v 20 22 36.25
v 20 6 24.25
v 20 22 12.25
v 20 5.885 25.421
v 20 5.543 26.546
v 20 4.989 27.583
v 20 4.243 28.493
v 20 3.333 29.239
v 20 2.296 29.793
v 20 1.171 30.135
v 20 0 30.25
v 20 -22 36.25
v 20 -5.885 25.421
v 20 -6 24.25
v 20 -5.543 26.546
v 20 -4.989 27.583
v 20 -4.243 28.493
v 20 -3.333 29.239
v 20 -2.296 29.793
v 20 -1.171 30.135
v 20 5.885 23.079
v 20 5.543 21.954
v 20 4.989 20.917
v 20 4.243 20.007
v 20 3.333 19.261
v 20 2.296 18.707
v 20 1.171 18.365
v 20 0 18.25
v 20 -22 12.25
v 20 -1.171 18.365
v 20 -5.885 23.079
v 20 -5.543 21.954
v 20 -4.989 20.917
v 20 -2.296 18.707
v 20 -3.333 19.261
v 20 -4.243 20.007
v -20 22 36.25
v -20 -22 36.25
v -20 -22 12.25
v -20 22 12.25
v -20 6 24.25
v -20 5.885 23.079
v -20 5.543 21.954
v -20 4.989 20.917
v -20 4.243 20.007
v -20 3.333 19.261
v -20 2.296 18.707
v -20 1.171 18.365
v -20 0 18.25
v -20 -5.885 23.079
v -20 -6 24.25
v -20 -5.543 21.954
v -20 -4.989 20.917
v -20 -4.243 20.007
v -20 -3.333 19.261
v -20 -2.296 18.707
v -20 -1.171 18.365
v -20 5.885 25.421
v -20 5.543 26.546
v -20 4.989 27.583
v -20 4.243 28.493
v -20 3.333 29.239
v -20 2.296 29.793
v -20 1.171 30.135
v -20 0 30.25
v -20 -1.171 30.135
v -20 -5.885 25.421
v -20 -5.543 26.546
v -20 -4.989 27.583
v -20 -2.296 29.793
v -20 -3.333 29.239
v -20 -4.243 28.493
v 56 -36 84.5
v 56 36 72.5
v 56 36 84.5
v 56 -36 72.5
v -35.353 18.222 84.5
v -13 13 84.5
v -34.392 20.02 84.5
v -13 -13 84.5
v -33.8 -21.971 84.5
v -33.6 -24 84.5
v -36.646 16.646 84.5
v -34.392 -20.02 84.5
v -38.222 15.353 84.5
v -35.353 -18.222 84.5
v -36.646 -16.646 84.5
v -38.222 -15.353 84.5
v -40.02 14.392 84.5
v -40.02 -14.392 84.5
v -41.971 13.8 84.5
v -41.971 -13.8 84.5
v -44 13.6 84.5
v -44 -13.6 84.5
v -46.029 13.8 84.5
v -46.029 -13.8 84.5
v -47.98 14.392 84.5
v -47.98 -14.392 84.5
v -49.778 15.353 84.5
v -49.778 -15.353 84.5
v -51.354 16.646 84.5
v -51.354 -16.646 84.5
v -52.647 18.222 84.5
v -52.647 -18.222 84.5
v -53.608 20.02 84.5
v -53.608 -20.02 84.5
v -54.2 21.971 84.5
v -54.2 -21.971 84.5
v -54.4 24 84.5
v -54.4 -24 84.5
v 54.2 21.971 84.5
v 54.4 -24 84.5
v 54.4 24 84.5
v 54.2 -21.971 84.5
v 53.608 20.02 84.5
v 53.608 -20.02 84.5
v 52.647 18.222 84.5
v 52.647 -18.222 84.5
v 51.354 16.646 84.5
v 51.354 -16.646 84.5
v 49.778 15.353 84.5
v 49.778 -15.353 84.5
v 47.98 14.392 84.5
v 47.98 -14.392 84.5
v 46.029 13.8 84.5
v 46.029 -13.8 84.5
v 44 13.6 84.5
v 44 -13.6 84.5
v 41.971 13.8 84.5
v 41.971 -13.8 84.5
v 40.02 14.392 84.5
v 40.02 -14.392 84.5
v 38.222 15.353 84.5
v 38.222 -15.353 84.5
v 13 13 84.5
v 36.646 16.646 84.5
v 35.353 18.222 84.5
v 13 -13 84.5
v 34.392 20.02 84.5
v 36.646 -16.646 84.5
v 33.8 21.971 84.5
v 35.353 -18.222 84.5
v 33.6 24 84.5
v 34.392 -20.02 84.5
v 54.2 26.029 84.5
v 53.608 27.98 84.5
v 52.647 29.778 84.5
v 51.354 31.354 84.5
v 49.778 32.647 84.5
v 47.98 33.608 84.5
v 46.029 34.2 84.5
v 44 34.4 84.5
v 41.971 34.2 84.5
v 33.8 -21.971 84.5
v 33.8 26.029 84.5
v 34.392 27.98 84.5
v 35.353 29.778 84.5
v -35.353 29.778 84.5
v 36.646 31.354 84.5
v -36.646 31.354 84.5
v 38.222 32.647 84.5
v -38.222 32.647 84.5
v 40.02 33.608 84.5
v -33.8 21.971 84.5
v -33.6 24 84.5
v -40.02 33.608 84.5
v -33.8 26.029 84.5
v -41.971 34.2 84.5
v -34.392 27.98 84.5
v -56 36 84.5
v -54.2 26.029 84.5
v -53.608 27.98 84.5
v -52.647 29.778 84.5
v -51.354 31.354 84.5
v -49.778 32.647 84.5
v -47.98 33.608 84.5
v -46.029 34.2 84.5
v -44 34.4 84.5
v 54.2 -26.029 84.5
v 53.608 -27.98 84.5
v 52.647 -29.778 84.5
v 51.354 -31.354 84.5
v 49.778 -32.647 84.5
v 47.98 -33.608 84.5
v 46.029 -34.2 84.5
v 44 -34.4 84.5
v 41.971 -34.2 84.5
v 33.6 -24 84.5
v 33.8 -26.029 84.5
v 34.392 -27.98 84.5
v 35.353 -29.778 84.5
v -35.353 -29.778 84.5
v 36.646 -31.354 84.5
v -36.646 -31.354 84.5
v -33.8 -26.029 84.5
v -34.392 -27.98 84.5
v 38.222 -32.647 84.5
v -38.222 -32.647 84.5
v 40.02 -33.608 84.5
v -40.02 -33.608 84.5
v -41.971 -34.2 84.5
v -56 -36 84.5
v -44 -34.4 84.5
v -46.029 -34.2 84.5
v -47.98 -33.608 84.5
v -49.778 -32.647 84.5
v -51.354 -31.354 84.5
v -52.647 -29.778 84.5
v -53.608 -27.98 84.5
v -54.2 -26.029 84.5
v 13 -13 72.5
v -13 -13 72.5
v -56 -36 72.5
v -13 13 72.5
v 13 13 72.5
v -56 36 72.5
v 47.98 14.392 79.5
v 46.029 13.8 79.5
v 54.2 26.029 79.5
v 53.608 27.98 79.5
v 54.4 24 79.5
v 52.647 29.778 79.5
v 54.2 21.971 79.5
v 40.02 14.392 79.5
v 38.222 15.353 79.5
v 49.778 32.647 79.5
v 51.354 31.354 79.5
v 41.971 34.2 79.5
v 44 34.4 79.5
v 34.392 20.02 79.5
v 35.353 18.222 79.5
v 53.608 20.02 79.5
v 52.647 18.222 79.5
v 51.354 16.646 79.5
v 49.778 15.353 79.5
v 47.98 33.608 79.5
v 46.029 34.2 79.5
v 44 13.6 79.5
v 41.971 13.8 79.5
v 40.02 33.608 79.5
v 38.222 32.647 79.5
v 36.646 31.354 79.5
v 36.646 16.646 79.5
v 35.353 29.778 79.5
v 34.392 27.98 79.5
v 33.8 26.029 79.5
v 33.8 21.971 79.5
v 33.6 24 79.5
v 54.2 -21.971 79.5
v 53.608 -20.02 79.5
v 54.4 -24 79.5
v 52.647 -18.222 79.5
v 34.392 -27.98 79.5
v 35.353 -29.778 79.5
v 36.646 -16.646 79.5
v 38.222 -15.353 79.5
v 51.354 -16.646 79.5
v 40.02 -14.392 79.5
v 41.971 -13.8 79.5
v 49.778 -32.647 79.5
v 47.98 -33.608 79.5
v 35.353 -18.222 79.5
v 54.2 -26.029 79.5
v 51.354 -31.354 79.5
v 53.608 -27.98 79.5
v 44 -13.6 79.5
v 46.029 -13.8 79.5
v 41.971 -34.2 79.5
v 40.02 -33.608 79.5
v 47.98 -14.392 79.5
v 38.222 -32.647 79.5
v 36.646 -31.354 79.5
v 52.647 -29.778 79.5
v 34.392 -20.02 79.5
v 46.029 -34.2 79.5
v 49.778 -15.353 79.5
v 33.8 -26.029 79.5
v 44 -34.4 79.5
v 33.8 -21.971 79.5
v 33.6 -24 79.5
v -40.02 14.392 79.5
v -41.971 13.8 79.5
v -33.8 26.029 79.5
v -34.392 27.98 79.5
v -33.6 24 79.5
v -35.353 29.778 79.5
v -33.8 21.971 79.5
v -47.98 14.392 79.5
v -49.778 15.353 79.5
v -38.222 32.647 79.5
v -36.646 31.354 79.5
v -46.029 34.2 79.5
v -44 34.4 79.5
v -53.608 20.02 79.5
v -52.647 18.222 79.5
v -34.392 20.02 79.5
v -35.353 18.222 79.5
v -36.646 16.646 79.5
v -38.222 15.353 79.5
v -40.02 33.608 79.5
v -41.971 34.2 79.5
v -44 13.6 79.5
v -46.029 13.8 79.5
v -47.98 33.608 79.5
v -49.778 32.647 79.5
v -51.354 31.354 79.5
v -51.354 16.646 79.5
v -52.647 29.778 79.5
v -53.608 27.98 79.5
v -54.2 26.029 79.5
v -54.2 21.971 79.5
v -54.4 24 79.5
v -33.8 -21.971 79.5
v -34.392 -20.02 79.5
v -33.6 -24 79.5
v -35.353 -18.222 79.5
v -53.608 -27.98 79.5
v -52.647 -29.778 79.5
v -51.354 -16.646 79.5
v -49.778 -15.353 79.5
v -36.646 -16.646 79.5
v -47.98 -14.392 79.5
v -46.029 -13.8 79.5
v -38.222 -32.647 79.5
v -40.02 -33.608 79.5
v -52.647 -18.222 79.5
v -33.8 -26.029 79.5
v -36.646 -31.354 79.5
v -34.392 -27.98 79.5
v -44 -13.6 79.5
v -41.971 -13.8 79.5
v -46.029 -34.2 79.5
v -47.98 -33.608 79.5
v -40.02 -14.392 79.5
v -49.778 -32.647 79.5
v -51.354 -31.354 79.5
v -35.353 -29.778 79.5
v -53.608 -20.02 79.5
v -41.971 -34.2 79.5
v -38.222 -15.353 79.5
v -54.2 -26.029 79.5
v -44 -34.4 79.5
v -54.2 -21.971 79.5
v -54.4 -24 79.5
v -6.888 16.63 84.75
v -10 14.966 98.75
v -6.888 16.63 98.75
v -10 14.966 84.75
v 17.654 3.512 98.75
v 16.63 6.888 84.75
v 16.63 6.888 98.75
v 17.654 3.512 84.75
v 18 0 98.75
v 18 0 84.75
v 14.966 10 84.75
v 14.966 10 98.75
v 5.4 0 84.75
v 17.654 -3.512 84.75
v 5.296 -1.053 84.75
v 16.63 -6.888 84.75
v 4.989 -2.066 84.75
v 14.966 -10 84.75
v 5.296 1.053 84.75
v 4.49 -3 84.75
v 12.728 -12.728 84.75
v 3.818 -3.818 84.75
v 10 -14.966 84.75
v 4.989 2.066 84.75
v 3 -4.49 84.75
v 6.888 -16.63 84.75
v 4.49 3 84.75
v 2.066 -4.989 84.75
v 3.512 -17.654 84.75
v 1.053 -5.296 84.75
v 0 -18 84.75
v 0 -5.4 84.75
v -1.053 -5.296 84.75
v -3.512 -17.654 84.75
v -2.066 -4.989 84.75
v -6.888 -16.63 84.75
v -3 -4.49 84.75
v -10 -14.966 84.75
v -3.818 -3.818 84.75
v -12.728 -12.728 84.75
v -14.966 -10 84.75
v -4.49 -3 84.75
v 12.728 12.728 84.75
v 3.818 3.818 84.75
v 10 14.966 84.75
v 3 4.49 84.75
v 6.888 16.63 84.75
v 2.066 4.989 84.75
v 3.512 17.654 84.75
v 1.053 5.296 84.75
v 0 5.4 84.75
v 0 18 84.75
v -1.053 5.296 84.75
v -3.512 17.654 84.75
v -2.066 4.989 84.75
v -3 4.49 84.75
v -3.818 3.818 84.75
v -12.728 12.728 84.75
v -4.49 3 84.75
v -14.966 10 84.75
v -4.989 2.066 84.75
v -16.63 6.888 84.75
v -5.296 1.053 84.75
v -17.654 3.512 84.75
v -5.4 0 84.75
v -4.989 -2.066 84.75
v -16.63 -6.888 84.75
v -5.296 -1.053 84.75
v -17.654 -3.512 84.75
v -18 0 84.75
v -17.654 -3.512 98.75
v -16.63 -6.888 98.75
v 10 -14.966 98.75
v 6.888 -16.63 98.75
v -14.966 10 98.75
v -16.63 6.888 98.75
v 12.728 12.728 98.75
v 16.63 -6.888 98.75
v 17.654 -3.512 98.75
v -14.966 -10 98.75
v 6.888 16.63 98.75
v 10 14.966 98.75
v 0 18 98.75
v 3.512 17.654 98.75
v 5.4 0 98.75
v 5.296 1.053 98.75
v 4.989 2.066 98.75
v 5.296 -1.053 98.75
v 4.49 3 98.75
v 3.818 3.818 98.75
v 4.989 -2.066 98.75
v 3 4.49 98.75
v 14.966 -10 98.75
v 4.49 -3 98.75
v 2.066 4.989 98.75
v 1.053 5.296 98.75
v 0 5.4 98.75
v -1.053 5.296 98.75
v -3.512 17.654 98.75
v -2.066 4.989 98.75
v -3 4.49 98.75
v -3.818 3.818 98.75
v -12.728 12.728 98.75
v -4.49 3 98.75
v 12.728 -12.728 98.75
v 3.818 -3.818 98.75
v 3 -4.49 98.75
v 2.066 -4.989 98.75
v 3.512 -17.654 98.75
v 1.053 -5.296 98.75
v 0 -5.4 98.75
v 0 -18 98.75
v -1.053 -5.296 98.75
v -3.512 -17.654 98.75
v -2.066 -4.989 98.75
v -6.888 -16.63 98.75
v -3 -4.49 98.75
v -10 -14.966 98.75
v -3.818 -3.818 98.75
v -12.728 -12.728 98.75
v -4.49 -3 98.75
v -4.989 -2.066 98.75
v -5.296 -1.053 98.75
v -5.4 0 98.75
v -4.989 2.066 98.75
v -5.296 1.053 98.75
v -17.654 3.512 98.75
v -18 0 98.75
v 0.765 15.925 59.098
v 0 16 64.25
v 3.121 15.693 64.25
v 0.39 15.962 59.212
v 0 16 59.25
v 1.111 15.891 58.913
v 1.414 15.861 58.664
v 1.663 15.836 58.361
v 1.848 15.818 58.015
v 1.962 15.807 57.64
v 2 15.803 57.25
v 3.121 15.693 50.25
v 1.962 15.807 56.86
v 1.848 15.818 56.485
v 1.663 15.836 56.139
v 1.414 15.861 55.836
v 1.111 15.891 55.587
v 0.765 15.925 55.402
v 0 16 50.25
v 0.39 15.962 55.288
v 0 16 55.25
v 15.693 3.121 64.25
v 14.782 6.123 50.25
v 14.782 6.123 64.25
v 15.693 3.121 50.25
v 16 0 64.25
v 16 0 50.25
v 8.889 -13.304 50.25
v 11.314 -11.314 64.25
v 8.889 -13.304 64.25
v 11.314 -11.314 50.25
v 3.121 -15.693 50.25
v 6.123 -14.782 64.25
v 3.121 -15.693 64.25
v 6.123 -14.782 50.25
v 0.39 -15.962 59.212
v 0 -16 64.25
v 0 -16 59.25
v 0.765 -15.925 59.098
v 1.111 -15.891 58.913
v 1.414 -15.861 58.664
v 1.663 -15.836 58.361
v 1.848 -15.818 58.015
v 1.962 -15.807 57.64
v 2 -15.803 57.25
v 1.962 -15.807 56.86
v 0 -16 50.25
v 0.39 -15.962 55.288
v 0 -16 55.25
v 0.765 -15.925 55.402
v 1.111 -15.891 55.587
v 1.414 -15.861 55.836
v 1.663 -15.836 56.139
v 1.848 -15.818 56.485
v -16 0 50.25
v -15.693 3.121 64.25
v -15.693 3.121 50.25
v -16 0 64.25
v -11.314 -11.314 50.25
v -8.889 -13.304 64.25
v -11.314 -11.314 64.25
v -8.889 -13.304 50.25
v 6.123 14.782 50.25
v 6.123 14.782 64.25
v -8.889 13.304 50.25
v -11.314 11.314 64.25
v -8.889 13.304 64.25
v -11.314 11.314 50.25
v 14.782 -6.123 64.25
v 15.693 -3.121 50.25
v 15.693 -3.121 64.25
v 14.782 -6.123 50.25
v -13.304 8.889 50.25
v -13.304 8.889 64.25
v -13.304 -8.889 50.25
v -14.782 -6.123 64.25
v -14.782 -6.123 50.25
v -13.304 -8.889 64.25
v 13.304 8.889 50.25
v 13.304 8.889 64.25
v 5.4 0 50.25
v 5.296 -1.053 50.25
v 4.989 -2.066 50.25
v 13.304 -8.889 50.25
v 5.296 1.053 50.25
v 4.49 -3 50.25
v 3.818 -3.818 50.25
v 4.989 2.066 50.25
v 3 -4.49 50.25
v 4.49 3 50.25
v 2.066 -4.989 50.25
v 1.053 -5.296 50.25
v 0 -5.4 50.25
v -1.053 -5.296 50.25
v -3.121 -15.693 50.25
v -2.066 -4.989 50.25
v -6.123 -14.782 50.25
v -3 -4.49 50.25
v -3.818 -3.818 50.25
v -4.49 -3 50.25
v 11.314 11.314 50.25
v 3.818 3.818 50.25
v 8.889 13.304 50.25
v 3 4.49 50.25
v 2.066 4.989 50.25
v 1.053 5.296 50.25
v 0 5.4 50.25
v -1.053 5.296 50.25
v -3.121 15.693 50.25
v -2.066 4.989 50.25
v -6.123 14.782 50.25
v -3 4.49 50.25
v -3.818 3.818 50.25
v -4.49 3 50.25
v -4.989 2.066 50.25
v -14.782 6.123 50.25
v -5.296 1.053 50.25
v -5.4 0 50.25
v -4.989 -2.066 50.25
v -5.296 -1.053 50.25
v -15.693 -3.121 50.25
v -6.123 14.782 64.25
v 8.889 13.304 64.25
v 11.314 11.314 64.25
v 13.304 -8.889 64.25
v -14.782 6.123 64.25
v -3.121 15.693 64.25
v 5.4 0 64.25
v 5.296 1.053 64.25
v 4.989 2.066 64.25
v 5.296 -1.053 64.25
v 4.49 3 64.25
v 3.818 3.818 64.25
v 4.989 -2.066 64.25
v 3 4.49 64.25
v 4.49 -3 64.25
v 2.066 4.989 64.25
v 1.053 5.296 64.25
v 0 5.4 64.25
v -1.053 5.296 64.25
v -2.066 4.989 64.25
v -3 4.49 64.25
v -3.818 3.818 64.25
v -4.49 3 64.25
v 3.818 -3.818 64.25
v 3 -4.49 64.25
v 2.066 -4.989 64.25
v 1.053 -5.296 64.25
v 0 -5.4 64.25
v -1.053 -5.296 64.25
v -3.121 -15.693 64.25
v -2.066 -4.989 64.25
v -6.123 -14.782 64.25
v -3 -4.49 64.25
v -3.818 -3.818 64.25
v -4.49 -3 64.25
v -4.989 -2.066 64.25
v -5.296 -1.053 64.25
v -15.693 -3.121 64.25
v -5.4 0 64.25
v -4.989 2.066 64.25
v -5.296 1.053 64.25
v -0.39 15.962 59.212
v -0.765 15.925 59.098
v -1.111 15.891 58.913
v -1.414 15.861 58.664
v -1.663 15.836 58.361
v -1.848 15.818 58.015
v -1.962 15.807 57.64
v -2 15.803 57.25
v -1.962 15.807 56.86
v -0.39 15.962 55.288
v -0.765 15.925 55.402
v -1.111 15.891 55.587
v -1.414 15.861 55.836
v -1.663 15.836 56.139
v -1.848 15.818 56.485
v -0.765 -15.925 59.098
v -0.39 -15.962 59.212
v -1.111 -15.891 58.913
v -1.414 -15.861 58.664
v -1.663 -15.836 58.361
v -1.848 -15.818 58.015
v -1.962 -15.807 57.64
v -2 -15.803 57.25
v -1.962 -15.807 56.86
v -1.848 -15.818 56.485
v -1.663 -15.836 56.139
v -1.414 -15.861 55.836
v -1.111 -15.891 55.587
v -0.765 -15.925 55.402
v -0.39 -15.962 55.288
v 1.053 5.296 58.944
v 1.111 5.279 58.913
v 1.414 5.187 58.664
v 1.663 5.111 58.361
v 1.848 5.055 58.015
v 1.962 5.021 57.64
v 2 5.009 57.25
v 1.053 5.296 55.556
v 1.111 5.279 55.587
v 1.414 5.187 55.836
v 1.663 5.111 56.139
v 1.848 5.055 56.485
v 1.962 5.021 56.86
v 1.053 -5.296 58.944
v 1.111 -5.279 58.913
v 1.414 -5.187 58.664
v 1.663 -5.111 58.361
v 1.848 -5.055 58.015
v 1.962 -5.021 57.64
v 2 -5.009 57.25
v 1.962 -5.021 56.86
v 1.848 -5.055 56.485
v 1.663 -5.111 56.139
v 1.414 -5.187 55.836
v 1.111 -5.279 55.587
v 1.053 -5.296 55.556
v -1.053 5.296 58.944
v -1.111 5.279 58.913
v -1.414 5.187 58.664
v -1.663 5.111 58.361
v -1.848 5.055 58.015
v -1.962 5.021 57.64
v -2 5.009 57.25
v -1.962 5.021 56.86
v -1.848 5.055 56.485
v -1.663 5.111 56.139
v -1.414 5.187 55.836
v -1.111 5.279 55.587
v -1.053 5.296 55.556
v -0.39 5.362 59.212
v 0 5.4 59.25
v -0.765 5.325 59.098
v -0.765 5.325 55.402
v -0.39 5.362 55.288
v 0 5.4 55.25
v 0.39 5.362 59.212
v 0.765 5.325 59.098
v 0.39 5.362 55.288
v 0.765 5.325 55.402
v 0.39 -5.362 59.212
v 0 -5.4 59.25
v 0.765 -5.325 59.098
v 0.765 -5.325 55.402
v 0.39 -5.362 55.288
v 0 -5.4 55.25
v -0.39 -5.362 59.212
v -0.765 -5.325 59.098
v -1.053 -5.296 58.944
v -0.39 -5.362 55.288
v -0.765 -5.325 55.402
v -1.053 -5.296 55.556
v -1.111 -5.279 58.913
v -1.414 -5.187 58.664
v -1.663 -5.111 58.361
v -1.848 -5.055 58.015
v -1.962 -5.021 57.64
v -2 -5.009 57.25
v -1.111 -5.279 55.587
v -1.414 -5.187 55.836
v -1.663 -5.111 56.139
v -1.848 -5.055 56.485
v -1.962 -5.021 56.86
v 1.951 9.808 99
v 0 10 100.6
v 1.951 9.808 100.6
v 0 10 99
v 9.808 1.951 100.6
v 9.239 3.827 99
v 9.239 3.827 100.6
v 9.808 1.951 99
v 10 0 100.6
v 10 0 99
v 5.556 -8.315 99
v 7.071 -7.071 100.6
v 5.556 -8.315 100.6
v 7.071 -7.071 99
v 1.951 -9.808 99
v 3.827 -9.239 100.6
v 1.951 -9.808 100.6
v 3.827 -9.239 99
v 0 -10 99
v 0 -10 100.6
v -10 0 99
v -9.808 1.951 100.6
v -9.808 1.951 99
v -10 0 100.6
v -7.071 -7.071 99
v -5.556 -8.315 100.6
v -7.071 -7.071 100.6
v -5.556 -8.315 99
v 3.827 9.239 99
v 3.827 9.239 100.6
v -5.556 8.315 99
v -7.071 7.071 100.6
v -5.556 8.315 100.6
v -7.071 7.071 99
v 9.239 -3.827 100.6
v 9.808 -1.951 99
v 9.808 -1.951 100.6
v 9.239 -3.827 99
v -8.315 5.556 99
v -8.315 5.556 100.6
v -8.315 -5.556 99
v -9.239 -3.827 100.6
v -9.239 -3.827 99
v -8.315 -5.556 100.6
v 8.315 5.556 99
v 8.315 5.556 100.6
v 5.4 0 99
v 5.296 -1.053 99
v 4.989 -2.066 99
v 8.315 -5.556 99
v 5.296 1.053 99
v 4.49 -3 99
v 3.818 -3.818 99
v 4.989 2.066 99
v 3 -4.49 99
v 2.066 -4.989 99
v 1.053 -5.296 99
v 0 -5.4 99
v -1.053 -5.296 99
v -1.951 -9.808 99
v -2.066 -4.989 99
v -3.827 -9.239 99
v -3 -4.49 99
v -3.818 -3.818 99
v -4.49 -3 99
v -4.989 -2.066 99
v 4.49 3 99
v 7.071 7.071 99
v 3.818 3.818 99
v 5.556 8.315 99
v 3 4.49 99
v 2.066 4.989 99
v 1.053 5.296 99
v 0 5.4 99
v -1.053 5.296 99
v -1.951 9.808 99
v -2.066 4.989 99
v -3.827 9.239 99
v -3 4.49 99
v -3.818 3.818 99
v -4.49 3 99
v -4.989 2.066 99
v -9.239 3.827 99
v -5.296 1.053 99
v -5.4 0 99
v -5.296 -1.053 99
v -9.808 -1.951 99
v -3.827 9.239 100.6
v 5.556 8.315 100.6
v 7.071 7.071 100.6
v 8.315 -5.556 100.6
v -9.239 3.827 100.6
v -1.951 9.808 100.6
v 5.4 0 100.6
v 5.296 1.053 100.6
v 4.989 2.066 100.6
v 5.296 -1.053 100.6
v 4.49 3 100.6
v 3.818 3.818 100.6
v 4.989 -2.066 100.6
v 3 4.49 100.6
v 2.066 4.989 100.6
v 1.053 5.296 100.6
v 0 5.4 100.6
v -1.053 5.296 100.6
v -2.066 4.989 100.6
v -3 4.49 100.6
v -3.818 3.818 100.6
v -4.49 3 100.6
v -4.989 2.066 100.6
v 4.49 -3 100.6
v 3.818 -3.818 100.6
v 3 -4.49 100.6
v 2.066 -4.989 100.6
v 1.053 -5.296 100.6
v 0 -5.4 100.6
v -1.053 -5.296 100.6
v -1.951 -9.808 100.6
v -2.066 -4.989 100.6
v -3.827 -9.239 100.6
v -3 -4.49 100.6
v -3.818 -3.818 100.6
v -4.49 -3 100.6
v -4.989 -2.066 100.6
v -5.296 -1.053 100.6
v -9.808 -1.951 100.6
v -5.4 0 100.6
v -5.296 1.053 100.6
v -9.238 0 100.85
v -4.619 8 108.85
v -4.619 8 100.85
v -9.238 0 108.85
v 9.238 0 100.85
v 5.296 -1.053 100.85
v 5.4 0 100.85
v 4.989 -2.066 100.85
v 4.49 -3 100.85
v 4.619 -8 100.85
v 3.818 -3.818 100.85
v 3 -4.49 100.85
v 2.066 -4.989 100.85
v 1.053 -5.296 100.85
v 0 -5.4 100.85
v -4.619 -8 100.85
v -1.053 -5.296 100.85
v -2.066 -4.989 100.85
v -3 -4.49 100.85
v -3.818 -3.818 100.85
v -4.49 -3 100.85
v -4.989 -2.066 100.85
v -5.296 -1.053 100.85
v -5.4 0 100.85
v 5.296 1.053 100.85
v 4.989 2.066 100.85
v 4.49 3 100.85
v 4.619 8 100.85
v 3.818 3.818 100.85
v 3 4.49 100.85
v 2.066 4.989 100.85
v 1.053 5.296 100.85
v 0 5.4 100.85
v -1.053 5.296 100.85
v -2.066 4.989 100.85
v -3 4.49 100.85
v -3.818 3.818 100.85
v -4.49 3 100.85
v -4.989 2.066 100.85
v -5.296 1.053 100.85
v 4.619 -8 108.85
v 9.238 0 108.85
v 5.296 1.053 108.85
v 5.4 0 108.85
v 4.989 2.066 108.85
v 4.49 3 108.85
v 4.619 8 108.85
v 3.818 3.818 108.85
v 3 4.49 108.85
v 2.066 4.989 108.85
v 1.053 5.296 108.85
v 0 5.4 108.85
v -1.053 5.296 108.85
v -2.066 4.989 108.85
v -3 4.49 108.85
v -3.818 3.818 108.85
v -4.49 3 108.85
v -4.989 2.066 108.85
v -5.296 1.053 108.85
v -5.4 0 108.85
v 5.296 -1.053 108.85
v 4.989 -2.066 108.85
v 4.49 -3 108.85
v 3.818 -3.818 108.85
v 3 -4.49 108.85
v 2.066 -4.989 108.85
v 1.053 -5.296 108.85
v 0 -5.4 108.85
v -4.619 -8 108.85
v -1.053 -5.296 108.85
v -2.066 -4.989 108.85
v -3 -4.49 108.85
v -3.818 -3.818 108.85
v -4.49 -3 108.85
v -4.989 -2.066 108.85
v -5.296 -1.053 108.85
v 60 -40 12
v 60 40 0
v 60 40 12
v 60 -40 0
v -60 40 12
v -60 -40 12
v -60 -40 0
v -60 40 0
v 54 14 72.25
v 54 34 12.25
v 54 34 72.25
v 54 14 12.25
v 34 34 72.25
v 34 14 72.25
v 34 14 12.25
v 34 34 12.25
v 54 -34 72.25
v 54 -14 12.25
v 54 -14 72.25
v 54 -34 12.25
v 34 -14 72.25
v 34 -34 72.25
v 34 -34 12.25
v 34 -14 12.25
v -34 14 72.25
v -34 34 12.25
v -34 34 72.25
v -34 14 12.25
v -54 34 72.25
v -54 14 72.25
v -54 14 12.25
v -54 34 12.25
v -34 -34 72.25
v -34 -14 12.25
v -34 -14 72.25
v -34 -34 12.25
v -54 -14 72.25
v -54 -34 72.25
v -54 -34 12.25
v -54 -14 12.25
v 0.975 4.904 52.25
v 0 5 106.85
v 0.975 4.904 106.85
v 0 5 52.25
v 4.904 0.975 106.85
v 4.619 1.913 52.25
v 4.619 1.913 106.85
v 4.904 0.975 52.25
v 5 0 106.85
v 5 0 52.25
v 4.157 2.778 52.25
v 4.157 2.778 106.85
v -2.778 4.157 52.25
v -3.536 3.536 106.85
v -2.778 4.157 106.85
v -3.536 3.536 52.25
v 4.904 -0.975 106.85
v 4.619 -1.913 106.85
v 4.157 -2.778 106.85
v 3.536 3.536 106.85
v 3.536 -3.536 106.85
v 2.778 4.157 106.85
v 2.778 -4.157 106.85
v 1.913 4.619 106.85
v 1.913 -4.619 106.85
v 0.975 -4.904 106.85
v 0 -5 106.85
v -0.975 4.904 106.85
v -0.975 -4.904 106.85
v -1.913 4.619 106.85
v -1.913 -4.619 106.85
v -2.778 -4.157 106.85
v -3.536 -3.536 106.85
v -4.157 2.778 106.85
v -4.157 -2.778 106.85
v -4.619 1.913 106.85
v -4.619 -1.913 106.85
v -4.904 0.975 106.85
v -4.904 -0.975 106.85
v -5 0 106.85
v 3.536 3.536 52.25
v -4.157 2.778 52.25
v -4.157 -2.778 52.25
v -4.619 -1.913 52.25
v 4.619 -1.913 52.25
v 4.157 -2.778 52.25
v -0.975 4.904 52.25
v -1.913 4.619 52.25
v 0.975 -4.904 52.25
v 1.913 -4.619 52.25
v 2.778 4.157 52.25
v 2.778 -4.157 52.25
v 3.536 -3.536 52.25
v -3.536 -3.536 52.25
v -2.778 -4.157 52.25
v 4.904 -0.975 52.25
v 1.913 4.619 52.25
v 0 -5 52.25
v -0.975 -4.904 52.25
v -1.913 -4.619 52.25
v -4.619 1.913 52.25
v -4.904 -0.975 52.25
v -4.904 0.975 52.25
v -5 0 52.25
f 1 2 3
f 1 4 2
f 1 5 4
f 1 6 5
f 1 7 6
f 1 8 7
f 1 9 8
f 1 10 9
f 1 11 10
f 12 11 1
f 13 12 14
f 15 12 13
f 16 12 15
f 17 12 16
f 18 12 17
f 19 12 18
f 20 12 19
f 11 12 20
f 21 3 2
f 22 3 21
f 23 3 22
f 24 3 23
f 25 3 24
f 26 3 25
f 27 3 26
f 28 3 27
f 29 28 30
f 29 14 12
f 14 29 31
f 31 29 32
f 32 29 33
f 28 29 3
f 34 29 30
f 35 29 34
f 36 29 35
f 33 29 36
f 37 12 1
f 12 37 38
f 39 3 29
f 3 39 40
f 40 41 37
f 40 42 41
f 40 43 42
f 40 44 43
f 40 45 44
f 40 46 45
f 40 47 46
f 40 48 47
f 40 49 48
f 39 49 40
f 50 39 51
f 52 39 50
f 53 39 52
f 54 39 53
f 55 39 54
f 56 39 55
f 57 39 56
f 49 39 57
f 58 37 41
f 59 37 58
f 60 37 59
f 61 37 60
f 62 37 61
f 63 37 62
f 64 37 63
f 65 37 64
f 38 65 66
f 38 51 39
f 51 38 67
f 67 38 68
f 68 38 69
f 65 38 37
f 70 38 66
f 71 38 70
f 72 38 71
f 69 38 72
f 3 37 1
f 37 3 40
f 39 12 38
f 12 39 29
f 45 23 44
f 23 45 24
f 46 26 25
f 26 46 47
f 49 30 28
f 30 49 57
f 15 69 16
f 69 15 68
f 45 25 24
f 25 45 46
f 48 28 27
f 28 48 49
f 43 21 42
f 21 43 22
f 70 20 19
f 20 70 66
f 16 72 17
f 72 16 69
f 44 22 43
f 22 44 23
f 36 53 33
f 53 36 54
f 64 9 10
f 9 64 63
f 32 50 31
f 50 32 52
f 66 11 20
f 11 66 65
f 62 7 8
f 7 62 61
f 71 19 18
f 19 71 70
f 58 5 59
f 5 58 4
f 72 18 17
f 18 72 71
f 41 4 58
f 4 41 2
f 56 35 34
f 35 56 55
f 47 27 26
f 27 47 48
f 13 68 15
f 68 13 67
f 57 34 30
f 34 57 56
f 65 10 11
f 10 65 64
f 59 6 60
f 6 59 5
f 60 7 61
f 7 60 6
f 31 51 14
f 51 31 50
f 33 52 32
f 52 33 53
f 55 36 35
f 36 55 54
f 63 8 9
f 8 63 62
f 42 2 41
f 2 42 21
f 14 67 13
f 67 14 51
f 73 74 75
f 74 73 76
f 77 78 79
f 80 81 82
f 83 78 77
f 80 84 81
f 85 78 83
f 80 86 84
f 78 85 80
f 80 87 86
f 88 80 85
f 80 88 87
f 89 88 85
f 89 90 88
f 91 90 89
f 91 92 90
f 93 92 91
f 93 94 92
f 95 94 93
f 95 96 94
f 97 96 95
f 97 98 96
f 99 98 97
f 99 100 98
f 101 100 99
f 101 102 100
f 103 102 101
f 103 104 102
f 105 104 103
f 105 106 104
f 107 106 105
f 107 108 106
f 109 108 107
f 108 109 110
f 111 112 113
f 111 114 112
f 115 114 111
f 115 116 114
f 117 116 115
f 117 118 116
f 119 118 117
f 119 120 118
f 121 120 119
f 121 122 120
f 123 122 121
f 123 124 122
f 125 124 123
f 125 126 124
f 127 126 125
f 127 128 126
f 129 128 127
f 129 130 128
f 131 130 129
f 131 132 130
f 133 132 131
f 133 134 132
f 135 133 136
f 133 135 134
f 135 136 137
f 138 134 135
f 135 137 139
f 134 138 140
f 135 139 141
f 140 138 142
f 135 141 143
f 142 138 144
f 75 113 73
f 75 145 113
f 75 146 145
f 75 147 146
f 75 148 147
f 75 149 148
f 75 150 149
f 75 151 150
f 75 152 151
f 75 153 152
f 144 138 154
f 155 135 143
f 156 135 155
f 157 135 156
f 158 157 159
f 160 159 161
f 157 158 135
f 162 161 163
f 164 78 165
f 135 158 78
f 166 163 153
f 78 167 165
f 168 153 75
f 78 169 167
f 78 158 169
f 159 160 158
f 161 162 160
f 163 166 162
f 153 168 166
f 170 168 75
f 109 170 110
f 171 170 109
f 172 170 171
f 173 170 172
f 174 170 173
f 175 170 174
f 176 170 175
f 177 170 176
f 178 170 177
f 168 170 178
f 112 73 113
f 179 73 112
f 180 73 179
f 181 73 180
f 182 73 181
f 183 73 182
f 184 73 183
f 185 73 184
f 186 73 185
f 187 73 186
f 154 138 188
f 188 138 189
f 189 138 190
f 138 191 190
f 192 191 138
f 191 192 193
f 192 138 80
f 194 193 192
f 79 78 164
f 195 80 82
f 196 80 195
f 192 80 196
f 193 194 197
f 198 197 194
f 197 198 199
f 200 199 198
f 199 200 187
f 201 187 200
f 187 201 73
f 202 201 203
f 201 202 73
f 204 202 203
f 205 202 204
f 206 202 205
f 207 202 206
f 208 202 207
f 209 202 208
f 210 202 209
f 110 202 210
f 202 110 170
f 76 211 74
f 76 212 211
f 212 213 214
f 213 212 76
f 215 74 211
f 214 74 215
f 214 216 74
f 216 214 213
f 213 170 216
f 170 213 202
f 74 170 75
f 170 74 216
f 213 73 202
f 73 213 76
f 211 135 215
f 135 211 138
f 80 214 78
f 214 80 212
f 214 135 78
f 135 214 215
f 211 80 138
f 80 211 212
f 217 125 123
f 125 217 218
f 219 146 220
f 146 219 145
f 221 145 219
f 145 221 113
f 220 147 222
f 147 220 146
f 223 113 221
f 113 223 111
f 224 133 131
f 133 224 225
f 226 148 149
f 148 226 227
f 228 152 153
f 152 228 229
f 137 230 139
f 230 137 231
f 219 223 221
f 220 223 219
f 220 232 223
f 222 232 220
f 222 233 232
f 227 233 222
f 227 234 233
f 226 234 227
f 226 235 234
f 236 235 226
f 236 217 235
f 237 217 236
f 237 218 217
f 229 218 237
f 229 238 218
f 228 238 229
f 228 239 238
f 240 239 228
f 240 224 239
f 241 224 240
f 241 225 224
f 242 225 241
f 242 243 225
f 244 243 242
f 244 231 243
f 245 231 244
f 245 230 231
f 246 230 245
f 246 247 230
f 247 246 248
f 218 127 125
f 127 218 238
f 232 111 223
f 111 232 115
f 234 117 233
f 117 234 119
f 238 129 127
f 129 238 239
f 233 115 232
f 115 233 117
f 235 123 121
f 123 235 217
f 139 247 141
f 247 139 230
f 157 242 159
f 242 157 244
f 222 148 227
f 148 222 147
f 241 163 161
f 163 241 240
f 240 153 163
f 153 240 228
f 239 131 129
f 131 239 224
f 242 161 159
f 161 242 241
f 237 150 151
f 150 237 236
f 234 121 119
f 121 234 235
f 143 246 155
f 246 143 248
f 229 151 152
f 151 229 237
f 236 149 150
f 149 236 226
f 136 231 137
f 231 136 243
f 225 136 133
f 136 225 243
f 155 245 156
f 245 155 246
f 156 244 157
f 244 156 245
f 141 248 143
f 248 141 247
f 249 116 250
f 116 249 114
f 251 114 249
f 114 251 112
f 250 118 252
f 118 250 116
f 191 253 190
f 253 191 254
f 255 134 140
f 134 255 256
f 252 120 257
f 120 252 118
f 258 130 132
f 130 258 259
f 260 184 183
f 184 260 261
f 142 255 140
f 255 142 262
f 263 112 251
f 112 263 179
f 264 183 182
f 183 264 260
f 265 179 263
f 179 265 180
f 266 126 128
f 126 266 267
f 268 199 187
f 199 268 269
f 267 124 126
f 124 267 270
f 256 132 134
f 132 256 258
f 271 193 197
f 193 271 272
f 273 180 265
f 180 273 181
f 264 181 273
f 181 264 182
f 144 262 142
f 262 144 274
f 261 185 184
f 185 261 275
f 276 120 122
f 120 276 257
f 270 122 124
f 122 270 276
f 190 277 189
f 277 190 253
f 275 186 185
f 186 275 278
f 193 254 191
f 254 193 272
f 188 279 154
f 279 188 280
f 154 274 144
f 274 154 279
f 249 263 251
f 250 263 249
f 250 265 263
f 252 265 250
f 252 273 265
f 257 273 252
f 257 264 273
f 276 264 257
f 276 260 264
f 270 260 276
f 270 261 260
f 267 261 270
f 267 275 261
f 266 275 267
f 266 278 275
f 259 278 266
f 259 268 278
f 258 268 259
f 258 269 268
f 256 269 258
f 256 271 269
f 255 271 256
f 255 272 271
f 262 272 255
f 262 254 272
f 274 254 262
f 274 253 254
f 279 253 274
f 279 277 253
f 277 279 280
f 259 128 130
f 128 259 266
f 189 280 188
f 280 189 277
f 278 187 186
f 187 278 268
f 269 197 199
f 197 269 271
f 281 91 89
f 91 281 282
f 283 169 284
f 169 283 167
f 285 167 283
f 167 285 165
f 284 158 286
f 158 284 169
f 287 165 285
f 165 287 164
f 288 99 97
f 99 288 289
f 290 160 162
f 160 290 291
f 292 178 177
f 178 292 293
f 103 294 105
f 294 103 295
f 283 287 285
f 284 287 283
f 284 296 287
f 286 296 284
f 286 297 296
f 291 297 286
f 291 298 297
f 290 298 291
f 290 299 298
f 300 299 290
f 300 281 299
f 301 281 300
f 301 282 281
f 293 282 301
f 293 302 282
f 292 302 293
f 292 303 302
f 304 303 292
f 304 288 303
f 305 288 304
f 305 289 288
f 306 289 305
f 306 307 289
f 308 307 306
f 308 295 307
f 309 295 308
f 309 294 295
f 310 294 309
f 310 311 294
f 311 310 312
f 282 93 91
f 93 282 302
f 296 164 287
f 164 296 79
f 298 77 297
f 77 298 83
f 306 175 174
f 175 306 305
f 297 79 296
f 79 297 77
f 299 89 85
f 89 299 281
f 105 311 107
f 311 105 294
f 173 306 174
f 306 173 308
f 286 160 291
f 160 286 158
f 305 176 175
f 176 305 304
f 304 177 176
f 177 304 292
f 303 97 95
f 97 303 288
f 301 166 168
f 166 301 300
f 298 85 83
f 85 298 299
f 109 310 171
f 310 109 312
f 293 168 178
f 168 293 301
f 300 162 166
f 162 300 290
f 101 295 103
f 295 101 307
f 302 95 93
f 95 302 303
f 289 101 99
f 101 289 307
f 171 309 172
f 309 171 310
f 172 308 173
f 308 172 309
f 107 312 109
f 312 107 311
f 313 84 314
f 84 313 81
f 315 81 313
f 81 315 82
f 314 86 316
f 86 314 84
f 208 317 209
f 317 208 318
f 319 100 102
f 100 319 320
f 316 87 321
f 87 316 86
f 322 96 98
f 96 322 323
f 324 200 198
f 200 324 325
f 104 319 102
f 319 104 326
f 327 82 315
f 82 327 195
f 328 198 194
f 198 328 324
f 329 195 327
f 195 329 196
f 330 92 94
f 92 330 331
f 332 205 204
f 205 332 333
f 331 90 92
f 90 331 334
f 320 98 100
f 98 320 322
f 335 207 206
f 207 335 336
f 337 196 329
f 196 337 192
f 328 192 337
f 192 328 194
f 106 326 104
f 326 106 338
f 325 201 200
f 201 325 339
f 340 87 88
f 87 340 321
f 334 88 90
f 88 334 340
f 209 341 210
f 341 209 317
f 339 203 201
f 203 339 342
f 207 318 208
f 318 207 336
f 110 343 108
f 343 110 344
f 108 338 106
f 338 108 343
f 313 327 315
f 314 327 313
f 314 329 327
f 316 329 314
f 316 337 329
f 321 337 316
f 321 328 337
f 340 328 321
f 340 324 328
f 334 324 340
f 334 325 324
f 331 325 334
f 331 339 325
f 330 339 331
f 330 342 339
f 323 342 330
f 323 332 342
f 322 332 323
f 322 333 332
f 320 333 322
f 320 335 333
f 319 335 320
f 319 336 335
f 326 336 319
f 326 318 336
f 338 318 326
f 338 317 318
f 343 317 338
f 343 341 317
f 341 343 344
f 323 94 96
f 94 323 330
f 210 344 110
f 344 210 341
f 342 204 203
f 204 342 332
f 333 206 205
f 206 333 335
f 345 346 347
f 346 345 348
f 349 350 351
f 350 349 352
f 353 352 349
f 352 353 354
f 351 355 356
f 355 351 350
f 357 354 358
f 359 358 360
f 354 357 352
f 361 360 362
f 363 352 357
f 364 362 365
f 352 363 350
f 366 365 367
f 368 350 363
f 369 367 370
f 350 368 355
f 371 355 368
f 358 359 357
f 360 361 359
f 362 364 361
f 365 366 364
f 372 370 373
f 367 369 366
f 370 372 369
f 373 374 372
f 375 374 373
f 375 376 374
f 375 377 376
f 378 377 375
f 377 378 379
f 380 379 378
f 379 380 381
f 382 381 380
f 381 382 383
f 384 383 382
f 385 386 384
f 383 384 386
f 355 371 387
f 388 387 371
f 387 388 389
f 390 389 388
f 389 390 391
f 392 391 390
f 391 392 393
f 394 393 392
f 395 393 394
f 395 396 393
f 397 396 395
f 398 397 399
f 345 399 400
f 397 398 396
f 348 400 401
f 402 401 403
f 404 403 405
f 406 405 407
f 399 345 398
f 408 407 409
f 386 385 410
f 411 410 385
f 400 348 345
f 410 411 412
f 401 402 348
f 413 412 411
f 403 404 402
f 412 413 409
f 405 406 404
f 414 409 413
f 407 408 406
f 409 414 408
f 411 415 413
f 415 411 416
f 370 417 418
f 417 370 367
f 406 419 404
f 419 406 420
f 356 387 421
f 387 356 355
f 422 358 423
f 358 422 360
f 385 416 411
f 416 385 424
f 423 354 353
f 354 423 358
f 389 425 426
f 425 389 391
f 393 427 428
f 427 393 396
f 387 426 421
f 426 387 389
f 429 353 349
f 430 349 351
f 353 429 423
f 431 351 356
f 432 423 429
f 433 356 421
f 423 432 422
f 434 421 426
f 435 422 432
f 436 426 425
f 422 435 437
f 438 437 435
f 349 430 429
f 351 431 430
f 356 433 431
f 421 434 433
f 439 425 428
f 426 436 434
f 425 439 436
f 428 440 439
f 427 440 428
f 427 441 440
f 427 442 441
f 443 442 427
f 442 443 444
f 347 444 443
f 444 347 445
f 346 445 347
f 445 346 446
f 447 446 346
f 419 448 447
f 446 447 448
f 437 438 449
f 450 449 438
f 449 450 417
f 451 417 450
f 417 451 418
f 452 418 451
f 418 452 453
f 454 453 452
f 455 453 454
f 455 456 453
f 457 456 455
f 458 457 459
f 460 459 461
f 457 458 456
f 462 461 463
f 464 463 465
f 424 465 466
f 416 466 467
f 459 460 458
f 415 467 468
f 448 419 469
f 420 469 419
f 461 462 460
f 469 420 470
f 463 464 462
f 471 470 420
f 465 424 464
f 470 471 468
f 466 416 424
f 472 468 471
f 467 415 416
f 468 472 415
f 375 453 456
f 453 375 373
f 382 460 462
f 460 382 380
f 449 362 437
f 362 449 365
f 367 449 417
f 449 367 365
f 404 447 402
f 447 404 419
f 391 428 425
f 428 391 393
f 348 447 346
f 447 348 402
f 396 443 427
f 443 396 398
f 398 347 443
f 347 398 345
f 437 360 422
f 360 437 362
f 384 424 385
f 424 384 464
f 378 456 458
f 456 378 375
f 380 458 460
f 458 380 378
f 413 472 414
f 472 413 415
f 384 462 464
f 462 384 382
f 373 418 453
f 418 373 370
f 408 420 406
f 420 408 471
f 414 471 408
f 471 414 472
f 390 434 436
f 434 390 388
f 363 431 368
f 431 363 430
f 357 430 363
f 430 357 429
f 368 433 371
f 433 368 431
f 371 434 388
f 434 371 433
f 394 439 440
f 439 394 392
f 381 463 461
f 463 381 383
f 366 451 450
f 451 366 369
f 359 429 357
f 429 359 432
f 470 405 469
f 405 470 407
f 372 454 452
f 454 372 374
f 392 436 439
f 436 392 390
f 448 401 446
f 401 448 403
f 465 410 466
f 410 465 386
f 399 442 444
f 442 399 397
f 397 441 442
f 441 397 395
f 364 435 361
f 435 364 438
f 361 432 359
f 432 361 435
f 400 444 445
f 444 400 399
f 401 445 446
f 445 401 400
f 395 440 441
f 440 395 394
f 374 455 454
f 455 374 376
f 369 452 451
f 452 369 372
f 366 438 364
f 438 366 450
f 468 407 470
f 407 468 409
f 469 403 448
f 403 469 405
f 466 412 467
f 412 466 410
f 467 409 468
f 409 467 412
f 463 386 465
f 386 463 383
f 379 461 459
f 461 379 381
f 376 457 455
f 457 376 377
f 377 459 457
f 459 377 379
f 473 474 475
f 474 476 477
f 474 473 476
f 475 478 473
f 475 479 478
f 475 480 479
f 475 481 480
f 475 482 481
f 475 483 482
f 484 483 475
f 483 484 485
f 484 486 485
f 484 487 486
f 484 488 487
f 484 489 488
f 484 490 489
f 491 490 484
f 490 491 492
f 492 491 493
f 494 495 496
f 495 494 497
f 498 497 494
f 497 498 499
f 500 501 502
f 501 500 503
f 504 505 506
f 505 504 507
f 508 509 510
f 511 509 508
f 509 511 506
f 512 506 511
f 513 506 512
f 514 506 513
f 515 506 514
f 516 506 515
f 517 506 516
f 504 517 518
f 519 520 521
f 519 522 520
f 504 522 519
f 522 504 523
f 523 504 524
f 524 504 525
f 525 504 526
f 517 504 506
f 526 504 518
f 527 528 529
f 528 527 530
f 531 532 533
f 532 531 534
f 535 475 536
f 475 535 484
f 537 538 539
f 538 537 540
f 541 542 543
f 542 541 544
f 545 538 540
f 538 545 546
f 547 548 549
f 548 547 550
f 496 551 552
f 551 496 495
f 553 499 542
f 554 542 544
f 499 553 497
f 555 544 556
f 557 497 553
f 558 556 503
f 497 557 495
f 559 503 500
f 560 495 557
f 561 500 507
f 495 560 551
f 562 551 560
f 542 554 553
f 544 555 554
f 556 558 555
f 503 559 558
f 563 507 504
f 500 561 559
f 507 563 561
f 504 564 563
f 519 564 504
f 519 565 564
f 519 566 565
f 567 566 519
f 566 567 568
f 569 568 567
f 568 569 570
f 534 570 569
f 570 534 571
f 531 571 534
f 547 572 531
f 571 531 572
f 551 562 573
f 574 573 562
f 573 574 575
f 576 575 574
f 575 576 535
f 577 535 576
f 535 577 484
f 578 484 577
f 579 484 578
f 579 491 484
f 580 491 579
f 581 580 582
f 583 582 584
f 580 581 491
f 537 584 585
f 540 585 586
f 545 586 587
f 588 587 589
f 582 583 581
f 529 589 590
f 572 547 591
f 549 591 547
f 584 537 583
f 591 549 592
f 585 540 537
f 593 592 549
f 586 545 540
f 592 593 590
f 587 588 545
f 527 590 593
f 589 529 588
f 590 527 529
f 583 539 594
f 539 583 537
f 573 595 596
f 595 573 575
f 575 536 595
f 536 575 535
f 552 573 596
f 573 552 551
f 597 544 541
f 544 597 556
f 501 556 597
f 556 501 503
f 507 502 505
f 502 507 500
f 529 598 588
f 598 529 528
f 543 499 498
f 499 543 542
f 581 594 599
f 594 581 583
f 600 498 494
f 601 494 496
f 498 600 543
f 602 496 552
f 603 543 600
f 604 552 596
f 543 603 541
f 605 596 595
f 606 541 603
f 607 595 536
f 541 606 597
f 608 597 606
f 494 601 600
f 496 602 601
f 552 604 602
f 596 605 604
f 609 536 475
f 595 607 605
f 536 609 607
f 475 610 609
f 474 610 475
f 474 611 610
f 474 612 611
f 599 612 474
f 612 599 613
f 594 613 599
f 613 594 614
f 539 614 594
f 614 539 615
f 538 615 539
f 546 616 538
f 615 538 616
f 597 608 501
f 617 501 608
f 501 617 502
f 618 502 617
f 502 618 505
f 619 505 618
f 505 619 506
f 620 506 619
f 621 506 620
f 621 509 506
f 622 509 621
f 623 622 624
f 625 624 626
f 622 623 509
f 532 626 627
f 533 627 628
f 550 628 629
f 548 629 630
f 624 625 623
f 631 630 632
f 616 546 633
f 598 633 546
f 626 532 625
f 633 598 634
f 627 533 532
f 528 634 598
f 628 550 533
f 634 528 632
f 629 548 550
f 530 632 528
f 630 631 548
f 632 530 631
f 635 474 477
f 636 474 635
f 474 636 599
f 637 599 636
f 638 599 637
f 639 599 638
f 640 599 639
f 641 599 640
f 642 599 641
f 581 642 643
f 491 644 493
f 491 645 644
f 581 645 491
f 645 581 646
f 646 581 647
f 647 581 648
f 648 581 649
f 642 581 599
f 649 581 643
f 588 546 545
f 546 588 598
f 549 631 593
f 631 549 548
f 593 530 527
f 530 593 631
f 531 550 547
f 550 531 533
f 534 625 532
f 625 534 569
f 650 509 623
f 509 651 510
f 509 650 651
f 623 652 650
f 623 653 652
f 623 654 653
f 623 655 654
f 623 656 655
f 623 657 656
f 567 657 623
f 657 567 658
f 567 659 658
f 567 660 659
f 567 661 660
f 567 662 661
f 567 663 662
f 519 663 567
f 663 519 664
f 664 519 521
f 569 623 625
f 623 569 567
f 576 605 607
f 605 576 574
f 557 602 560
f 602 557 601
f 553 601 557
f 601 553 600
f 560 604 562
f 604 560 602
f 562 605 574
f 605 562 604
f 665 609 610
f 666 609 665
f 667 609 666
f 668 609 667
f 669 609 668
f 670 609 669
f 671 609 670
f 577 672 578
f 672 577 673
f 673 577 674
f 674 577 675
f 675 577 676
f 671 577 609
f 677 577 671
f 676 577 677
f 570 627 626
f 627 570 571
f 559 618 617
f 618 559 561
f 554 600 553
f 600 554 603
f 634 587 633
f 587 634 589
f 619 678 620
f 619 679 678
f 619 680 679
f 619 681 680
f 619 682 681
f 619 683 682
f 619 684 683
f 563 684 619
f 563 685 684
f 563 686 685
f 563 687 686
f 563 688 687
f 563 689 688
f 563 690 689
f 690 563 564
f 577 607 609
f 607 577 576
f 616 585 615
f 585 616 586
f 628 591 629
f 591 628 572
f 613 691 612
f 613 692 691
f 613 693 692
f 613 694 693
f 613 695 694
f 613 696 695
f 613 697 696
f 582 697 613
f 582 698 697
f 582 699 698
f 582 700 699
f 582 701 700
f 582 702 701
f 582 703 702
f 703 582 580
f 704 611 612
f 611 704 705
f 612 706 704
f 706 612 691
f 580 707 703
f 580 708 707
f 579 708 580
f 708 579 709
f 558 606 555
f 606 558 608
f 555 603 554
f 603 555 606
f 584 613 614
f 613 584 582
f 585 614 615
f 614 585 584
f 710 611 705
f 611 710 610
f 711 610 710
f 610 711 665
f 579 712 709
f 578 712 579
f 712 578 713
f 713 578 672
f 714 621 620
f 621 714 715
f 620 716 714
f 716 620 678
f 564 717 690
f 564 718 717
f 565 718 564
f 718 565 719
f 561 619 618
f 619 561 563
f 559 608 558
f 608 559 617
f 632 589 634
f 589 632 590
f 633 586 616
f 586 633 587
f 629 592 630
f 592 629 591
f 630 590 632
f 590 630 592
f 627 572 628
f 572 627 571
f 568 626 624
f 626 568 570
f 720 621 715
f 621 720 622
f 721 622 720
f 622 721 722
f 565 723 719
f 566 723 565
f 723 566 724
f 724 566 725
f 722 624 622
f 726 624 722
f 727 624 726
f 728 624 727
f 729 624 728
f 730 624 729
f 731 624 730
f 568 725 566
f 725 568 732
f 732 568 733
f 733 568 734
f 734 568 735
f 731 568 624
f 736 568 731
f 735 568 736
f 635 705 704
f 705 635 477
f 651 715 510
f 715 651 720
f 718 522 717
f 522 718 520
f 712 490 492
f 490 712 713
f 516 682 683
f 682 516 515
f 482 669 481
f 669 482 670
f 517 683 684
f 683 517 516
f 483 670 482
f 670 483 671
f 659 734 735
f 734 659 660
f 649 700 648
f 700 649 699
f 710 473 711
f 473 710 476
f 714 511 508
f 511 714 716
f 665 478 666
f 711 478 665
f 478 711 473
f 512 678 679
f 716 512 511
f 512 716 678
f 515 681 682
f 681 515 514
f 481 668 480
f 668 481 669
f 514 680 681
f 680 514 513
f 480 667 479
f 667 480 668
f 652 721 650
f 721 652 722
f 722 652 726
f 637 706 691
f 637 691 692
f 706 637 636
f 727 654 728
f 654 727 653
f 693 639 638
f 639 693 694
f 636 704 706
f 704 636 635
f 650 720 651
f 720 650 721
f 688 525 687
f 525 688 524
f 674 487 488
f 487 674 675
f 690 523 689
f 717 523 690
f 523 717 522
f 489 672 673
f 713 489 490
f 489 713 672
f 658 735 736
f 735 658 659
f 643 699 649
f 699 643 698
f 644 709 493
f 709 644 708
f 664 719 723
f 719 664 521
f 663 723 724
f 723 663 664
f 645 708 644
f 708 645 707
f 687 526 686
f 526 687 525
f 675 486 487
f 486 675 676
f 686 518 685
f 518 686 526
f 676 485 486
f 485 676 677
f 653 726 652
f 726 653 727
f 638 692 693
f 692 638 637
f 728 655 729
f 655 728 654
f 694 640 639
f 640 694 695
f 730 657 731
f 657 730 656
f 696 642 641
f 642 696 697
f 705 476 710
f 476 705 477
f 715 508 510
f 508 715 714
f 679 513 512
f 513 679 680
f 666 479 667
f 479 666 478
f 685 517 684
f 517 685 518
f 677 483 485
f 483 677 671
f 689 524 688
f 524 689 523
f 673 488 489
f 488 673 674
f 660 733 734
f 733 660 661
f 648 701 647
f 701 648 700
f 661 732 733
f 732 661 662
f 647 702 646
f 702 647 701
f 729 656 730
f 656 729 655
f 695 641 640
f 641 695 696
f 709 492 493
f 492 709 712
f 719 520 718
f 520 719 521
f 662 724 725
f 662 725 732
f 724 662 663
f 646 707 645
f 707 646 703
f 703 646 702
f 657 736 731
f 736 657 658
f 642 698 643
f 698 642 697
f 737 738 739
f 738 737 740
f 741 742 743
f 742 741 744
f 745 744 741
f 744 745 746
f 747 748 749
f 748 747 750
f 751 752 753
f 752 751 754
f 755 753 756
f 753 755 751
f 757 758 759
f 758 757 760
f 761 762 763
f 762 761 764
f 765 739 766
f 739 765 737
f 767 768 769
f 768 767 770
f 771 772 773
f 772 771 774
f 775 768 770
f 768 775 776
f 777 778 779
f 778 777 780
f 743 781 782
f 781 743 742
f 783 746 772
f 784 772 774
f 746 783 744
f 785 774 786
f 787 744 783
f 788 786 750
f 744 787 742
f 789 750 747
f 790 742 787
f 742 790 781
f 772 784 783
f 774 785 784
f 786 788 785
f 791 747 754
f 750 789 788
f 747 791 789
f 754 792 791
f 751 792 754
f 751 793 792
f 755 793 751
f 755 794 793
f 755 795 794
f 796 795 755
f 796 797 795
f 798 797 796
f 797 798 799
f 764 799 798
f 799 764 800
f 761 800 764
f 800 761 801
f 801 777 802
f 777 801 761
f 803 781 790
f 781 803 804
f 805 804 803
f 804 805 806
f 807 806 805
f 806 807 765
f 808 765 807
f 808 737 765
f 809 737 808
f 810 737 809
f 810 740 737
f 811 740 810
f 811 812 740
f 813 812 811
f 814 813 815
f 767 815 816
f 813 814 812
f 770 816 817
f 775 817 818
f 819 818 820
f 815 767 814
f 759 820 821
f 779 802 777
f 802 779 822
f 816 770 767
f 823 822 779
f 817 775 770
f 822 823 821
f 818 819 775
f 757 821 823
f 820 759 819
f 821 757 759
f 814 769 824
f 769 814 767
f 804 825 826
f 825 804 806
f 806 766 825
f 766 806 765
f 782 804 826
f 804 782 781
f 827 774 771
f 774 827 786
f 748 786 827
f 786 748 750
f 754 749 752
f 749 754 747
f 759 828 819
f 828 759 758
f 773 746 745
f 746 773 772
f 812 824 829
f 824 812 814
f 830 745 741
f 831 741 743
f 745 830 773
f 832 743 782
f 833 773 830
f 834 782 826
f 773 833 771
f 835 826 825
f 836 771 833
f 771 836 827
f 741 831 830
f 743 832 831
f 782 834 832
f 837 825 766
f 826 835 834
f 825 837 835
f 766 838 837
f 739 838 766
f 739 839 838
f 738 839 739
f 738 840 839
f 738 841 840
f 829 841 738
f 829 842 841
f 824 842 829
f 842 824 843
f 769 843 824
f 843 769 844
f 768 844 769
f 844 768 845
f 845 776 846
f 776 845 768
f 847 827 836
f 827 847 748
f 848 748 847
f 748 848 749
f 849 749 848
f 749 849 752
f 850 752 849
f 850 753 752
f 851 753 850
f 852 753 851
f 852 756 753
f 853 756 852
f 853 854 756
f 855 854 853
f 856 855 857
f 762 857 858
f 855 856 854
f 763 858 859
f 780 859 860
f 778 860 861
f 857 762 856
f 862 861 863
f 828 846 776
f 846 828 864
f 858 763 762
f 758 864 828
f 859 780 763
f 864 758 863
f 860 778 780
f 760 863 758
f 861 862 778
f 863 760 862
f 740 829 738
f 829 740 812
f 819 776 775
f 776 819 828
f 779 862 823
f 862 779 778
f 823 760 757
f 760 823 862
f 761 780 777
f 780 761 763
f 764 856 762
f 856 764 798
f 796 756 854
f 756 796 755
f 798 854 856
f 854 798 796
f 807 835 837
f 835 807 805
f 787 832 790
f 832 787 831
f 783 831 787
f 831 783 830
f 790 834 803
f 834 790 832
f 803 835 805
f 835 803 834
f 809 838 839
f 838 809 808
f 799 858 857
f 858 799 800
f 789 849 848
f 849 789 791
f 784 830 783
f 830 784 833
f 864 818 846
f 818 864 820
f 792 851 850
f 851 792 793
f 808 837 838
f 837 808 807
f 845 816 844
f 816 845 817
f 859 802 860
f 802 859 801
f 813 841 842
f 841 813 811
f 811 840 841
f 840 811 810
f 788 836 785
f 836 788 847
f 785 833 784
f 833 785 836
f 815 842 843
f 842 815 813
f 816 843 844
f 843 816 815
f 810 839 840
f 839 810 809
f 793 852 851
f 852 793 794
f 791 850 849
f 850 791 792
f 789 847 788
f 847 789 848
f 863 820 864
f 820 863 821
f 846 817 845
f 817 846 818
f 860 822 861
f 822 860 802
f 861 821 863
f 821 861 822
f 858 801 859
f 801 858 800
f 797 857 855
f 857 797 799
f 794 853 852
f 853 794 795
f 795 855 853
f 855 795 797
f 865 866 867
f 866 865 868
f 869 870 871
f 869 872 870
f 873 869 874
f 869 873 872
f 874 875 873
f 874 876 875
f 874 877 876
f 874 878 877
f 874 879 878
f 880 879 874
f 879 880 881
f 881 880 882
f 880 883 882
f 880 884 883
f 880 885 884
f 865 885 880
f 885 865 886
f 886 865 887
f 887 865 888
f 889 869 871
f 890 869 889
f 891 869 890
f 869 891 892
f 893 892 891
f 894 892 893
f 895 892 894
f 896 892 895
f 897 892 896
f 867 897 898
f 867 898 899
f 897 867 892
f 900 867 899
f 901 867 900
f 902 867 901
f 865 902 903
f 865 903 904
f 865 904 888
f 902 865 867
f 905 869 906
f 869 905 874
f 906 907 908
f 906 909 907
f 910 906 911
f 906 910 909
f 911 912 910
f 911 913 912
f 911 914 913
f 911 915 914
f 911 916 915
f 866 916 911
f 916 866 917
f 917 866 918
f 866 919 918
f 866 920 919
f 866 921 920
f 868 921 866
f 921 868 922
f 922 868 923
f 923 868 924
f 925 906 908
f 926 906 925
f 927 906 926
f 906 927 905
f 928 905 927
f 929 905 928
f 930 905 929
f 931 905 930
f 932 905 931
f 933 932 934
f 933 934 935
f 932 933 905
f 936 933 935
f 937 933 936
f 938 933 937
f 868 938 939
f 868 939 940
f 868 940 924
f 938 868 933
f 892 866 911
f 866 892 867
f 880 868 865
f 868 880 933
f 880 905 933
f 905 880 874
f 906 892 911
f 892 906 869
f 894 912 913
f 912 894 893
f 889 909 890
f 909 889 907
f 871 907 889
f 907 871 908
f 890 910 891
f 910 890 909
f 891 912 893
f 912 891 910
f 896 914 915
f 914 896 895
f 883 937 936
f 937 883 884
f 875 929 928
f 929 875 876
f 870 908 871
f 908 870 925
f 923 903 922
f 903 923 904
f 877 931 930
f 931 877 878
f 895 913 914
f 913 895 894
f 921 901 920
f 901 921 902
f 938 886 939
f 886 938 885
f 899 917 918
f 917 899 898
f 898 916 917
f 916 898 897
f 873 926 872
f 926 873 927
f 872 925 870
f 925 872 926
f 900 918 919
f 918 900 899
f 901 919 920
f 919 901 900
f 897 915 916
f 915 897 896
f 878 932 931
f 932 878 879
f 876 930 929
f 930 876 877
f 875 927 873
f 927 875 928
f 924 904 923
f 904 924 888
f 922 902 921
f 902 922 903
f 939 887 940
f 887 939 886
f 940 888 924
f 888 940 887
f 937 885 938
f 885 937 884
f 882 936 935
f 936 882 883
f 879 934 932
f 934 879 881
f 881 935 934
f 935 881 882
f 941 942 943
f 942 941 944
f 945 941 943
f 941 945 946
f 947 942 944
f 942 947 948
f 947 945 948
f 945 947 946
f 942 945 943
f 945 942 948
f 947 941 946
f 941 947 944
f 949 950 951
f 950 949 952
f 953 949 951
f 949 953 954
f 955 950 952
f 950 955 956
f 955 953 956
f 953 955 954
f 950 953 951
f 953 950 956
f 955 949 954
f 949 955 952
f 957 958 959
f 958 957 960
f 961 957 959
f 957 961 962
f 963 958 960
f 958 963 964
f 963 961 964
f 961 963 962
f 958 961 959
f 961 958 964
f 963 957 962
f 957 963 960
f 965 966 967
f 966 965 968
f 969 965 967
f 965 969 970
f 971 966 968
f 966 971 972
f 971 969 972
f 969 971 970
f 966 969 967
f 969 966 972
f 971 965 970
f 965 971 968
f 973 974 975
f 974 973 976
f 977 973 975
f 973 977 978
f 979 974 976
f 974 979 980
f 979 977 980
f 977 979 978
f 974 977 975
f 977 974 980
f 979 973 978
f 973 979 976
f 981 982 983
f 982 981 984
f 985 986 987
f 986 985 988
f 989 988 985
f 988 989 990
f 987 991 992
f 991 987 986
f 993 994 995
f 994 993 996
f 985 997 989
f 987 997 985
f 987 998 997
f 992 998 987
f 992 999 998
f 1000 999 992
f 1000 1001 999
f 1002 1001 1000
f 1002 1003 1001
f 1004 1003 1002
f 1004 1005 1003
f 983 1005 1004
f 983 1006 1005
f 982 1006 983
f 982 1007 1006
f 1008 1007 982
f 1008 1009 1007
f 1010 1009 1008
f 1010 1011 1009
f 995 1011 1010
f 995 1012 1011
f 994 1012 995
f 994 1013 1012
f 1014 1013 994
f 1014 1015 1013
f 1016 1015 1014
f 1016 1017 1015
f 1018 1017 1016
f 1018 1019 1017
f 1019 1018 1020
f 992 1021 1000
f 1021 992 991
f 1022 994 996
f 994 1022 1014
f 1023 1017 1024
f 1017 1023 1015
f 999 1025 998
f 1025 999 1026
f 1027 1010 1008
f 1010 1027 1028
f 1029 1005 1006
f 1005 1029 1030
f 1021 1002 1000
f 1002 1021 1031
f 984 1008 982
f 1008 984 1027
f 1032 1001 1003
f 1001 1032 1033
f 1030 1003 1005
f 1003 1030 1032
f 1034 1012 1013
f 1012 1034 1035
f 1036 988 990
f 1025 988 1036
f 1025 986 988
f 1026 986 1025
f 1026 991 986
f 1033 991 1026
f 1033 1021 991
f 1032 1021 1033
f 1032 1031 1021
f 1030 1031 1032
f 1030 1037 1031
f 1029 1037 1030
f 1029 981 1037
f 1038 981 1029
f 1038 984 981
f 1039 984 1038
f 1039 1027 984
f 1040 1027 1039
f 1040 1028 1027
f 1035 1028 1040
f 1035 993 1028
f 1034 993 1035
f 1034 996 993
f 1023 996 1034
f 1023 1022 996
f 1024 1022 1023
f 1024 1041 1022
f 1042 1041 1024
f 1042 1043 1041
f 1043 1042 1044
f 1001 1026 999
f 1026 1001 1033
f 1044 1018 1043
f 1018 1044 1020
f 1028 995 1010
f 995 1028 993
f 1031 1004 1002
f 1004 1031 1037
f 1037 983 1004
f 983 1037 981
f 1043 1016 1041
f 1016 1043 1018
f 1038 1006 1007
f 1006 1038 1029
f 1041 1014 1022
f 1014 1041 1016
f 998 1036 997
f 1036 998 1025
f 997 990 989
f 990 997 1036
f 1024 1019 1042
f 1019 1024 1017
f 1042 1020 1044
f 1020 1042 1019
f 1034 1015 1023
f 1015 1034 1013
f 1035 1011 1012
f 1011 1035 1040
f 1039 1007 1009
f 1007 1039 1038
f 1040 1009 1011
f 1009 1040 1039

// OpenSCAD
$fn = 32;

// ------------------------------------------------------------------------
// Arbor press fixture: screw d10, posts 60 mm, gap 14 mm
// Every part is its own module, assembly() places every instance.
// ------------------------------------------------------------------------

// --- part 1 ---
module press_bed() {
  difference() {
    translate([-60, -40, 0]) cube([120, 80, 12]);
  }
}

// --- part 2 ---
module anvil_block() {
  difference() {
    translate([-20, -22, 0]) cube([40, 44, 24]);
    translate([0, 0, 12]) rotate([0, 90, 0]) cylinder(h = 42, d = 12, center = true);
  }
}

// --- part 3 ---
module press_post_a() {
  translate([-10, -10, 0]) cube([20, 20, 60]);
}

// --- part 4 ---
module press_post_b() {
  translate([-10, -10, 0]) cube([20, 20, 60]);
}

// --- part 5 ---
module press_post_c() {
  translate([-10, -10, 0]) cube([20, 20, 60]);
}

// --- part 6 ---
module press_post_d() {
  translate([-10, -10, 0]) cube([20, 20, 60]);
}

// --- part 7 ---
module press_frame() {
  difference() {
    translate([-56, -36, 0]) cube([112, 72, 12]);
    translate([-13, -13, -1]) cube([26, 26, 14]);
    translate([44, 24, 7]) cylinder(h = 6, d = 20.8);
    translate([44, -24, 7]) cylinder(h = 6, d = 20.8);
    translate([-44, 24, 7]) cylinder(h = 6, d = 20.8);
    translate([-44, -24, 7]) cylinder(h = 6, d = 20.8);
  }
}

// --- part 8 ---
module guide_ring() {
  difference() {
      translate([0, 0, 0]) cylinder(h = 14, d = 36);
      translate([0, 0, -1]) cylinder(h = 16, d = 10.8);
    }
}

// --- part 9 ---
module press_screw() {
  translate([0, 0, -27.3]) cylinder(h = 54.6, d = 10);
}

// --- part 10 ---
module press_head() {
  difference() {
    cylinder(h = 14, d = 32);
    translate([0, 0, -1]) cylinder(h = 16, d = 10.8);
    translate([0, 0, 7]) rotate([90, 0, 0]) cylinder(h = 34, d = 4, center = true);
  }
}

// --- part 11 ---
module nut_washer() {
  difference() {
      translate([0, 0, 0]) cylinder(h = 1.6, d = 20);
      translate([0, 0, -1]) cylinder(h = 3.6, d = 10.8);
    }
}

// --- part 12 ---
module press_nut() {
  difference() {
    linear_extrude(height = 8) polygon(points = [[9.238, 0], [4.619, 8], [-4.619, 8], [-9.238, 0], [-4.619, -8], [4.619, -8]]);
    translate([0, 0, -1]) cylinder(h = 10, d = 10.8);
  }
}

// --- assembly ---
module assembly() {
  color([0.80, 0.24, 0.20]) translate([0, 0, 0]) rotate([0, 0, 0]) press_bed();
  color([0.20, 0.45, 0.75]) translate([0, 0, 12.25]) rotate([0, 0, 0]) anvil_block();
  color([0.25, 0.62, 0.32]) translate([44, 24, 12.25]) rotate([0, 0, 0]) press_post_a();
  color([0.92, 0.70, 0.18]) translate([44, -24, 12.25]) rotate([0, 0, 0]) press_post_b();
  color([0.58, 0.35, 0.70]) translate([-44, 24, 12.25]) rotate([0, 0, 0]) press_post_c();
  color([0.16, 0.66, 0.66]) translate([-44, -24, 12.25]) rotate([0, 0, 0]) press_post_d();
  color([0.85, 0.48, 0.18]) translate([0, 0, 72.5]) rotate([0, 0, 0]) press_frame();
  color([0.55, 0.60, 0.65]) translate([0, 0, 84.75]) rotate([0, 0, 0]) guide_ring();
  color([0.75, 0.30, 0.55]) translate([0, 0, 79.55]) rotate([0, 0, 0]) press_screw();
  color([0.42, 0.52, 0.28]) translate([0, 0, 50.25]) rotate([0, 0, 0]) press_head();
  color([0.80, 0.24, 0.20]) translate([0, 0, 99]) rotate([0, 0, 0]) nut_washer();
  color([0.20, 0.45, 0.75]) translate([0, 0, 100.85]) rotate([0, 0, 0]) press_nut();
}

assembly();
